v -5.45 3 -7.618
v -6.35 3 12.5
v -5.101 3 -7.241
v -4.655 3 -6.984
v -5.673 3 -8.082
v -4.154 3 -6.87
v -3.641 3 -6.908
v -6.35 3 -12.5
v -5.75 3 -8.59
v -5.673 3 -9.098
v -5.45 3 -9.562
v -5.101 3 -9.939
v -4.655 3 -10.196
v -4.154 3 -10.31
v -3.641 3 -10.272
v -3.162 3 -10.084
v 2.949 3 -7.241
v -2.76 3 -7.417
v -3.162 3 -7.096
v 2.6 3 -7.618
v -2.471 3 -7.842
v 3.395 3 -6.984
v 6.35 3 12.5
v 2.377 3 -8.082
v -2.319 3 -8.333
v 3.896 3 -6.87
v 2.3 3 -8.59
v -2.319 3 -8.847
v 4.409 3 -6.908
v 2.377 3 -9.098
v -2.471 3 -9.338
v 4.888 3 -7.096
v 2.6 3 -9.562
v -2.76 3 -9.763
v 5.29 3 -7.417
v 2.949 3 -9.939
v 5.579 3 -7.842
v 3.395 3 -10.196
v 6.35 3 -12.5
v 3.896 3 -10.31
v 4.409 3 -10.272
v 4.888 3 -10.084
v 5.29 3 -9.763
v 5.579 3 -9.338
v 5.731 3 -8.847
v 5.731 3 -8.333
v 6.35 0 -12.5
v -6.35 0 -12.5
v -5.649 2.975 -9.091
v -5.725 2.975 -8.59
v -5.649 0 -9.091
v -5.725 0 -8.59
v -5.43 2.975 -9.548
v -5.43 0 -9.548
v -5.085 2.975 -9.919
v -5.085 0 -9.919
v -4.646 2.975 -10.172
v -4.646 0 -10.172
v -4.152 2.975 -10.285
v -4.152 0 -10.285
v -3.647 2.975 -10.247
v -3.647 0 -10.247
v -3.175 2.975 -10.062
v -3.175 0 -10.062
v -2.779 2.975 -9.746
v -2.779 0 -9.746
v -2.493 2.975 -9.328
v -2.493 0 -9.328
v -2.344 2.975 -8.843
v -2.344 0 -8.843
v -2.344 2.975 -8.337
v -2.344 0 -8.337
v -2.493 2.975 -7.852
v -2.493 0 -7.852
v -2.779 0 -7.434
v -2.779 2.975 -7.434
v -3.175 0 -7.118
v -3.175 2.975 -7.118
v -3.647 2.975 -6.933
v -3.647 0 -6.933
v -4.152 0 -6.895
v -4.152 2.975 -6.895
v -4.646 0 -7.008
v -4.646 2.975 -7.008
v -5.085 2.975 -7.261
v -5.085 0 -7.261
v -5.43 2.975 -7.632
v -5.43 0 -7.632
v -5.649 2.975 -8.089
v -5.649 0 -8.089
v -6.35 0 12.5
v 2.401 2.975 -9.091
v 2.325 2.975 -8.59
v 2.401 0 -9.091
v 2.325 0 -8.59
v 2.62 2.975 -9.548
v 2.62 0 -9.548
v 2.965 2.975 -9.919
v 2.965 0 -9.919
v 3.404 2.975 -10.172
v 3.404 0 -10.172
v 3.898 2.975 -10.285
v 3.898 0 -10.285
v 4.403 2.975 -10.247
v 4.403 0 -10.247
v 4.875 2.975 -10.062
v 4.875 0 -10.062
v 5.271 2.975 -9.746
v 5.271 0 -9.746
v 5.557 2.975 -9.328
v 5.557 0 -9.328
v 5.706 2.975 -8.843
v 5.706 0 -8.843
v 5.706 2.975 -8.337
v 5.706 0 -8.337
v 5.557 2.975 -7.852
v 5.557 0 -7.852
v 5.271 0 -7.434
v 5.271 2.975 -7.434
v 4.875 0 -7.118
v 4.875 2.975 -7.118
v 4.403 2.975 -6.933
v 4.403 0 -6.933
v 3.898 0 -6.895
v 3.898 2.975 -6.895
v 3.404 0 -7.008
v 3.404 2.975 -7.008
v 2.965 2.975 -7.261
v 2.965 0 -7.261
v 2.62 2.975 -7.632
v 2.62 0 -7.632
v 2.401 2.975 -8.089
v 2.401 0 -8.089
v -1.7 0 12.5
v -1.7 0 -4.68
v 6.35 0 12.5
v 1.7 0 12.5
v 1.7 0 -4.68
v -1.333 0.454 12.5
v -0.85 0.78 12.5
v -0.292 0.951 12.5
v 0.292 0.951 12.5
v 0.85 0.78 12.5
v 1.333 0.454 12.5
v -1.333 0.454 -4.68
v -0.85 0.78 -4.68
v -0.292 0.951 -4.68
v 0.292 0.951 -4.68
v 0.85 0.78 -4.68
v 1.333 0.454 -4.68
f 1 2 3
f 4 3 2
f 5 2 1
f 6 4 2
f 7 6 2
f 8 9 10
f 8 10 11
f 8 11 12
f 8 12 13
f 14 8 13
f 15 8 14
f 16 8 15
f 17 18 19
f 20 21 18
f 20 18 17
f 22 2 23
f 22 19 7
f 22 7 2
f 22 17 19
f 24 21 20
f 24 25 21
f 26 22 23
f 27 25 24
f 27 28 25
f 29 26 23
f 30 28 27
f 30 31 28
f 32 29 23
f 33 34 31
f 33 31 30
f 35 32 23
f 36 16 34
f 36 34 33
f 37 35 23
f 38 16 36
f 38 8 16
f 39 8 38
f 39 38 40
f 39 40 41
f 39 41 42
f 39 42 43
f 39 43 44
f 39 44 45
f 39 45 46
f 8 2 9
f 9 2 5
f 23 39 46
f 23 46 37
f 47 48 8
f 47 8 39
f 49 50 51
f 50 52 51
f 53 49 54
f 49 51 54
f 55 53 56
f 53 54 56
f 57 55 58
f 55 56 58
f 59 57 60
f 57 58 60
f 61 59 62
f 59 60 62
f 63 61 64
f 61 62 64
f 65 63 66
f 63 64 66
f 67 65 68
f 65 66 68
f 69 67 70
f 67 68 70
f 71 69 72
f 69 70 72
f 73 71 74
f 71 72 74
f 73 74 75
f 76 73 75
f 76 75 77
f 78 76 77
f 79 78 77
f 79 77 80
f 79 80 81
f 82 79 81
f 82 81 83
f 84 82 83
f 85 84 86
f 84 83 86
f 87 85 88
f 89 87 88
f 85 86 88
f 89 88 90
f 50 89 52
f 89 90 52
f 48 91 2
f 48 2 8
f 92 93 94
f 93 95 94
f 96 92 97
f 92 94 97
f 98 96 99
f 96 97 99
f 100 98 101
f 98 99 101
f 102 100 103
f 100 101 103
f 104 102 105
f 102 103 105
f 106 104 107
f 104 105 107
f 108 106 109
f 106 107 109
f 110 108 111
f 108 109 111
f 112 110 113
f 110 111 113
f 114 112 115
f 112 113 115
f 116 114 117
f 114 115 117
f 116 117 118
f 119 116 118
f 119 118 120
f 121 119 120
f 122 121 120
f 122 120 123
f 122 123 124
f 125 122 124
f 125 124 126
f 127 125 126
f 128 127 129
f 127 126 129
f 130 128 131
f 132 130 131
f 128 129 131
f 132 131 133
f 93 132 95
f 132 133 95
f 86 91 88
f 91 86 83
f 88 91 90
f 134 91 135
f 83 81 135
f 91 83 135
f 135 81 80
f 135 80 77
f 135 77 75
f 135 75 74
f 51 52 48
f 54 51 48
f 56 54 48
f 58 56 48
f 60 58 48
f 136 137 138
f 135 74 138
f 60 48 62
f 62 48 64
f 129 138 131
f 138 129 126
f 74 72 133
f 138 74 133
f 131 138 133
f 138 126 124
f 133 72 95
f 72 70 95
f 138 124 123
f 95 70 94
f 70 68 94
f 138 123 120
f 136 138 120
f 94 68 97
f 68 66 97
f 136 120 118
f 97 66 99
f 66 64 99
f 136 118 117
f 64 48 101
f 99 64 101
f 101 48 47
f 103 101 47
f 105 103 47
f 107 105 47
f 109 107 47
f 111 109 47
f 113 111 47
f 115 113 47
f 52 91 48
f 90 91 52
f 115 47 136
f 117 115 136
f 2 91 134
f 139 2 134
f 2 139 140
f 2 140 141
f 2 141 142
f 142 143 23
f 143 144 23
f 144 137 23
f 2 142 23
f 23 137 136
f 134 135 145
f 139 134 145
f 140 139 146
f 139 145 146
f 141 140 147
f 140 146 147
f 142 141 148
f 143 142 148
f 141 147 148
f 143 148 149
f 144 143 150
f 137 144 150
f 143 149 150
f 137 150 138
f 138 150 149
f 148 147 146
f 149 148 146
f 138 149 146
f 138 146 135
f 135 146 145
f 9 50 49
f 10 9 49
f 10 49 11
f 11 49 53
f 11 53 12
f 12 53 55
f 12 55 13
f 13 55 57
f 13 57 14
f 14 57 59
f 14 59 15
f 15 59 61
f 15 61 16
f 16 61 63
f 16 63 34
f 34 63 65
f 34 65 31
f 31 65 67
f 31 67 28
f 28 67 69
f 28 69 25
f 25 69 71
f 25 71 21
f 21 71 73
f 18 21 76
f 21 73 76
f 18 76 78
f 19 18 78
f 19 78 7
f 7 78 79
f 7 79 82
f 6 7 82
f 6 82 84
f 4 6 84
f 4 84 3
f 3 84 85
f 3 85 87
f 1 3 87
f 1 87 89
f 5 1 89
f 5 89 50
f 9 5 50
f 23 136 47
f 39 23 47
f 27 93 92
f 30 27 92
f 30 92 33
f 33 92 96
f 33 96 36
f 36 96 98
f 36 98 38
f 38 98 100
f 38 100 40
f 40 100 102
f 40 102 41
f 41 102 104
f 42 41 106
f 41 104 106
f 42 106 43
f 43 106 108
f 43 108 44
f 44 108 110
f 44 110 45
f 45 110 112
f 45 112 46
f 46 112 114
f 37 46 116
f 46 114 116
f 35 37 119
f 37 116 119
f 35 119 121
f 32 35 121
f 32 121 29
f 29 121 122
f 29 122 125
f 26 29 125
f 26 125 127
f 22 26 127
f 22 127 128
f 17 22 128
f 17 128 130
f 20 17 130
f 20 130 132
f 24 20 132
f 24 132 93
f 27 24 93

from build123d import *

# Parameters (mm, degrees)
SKETCH1_W                      = 12.7
SKETCH1_H                      = 25
BOSS_EXTRUDE1_DEPTH            = 3
CUT_EXTRUDE1_DEPTH             = 26.967720347
CUT_EXTRUDE1_DEPTH_BACK        = 17.18
M3_CLEARANCE_HOLE1_D           = 3.4
M3_CLEARANCE_HOLE1_DEPTH       = 3
M3_CLEARANCE_HOLE1_CSINK_D     = 3.45
M3_CLEARANCE_HOLE1_CSINK_ANGLE = 90
M3_CLEARANCE_HOLE1_TIP         = 1.021463052


with BuildPart() as part:
    # Sketch1 → Boss-Extrude1 (new body)
    with BuildSketch(Plane(origin=(0, 0, 0), x_dir=(1, 0, 0), z_dir=(0, 1, 0))):
        Rectangle(SKETCH1_W, SKETCH1_H)
    extrude(amount=BOSS_EXTRUDE1_DEPTH)

    # Sketch2 → Cut-Extrude1 (cut, two sides: drawn at the far end of the back side and taken through both)
    with BuildSketch(Plane.XY.offset(12.5).offset(-CUT_EXTRUDE1_DEPTH_BACK)):
        with BuildLine():
            Line((-15.481656951, -23.428816816), (-1.7, 0))
            ThreePointArc((-1.7, 0), (0, 0.972308292), (1.7, 0))
            Line((1.7, 0), (15.481656951, -23.428816816))
            Line((15.481656951, -23.428816816), (15.481656951, -77.792169389))
            Line((15.481656951, -77.792169389), (-15.481656951, -77.792169389))
            Line((-15.481656951, -77.792169389), (-15.481656951, -23.428816816))
        make_face()
    extrude(amount=CUT_EXTRUDE1_DEPTH + CUT_EXTRUDE1_DEPTH_BACK, mode=Mode.SUBTRACT)

    # M3 Clearance Hole1
    with Locations(Plane(origin=(0, 3, 0), x_dir=(1, 0, 0), z_dir=(0, 1, 0))):
        with Locations((-4.025, 8.59), (4.025, 8.59)):
            CounterSinkHole(M3_CLEARANCE_HOLE1_D / 2, M3_CLEARANCE_HOLE1_CSINK_D / 2, depth=M3_CLEARANCE_HOLE1_DEPTH, counter_sink_angle=M3_CLEARANCE_HOLE1_CSINK_ANGLE)
            with Locations((0, 0, -(M3_CLEARANCE_HOLE1_DEPTH + M3_CLEARANCE_HOLE1_TIP / 2))):  # 118° drill point
                Cone(0, M3_CLEARANCE_HOLE1_D / 2, M3_CLEARANCE_HOLE1_TIP, mode=Mode.SUBTRACT)


solid = part.part
